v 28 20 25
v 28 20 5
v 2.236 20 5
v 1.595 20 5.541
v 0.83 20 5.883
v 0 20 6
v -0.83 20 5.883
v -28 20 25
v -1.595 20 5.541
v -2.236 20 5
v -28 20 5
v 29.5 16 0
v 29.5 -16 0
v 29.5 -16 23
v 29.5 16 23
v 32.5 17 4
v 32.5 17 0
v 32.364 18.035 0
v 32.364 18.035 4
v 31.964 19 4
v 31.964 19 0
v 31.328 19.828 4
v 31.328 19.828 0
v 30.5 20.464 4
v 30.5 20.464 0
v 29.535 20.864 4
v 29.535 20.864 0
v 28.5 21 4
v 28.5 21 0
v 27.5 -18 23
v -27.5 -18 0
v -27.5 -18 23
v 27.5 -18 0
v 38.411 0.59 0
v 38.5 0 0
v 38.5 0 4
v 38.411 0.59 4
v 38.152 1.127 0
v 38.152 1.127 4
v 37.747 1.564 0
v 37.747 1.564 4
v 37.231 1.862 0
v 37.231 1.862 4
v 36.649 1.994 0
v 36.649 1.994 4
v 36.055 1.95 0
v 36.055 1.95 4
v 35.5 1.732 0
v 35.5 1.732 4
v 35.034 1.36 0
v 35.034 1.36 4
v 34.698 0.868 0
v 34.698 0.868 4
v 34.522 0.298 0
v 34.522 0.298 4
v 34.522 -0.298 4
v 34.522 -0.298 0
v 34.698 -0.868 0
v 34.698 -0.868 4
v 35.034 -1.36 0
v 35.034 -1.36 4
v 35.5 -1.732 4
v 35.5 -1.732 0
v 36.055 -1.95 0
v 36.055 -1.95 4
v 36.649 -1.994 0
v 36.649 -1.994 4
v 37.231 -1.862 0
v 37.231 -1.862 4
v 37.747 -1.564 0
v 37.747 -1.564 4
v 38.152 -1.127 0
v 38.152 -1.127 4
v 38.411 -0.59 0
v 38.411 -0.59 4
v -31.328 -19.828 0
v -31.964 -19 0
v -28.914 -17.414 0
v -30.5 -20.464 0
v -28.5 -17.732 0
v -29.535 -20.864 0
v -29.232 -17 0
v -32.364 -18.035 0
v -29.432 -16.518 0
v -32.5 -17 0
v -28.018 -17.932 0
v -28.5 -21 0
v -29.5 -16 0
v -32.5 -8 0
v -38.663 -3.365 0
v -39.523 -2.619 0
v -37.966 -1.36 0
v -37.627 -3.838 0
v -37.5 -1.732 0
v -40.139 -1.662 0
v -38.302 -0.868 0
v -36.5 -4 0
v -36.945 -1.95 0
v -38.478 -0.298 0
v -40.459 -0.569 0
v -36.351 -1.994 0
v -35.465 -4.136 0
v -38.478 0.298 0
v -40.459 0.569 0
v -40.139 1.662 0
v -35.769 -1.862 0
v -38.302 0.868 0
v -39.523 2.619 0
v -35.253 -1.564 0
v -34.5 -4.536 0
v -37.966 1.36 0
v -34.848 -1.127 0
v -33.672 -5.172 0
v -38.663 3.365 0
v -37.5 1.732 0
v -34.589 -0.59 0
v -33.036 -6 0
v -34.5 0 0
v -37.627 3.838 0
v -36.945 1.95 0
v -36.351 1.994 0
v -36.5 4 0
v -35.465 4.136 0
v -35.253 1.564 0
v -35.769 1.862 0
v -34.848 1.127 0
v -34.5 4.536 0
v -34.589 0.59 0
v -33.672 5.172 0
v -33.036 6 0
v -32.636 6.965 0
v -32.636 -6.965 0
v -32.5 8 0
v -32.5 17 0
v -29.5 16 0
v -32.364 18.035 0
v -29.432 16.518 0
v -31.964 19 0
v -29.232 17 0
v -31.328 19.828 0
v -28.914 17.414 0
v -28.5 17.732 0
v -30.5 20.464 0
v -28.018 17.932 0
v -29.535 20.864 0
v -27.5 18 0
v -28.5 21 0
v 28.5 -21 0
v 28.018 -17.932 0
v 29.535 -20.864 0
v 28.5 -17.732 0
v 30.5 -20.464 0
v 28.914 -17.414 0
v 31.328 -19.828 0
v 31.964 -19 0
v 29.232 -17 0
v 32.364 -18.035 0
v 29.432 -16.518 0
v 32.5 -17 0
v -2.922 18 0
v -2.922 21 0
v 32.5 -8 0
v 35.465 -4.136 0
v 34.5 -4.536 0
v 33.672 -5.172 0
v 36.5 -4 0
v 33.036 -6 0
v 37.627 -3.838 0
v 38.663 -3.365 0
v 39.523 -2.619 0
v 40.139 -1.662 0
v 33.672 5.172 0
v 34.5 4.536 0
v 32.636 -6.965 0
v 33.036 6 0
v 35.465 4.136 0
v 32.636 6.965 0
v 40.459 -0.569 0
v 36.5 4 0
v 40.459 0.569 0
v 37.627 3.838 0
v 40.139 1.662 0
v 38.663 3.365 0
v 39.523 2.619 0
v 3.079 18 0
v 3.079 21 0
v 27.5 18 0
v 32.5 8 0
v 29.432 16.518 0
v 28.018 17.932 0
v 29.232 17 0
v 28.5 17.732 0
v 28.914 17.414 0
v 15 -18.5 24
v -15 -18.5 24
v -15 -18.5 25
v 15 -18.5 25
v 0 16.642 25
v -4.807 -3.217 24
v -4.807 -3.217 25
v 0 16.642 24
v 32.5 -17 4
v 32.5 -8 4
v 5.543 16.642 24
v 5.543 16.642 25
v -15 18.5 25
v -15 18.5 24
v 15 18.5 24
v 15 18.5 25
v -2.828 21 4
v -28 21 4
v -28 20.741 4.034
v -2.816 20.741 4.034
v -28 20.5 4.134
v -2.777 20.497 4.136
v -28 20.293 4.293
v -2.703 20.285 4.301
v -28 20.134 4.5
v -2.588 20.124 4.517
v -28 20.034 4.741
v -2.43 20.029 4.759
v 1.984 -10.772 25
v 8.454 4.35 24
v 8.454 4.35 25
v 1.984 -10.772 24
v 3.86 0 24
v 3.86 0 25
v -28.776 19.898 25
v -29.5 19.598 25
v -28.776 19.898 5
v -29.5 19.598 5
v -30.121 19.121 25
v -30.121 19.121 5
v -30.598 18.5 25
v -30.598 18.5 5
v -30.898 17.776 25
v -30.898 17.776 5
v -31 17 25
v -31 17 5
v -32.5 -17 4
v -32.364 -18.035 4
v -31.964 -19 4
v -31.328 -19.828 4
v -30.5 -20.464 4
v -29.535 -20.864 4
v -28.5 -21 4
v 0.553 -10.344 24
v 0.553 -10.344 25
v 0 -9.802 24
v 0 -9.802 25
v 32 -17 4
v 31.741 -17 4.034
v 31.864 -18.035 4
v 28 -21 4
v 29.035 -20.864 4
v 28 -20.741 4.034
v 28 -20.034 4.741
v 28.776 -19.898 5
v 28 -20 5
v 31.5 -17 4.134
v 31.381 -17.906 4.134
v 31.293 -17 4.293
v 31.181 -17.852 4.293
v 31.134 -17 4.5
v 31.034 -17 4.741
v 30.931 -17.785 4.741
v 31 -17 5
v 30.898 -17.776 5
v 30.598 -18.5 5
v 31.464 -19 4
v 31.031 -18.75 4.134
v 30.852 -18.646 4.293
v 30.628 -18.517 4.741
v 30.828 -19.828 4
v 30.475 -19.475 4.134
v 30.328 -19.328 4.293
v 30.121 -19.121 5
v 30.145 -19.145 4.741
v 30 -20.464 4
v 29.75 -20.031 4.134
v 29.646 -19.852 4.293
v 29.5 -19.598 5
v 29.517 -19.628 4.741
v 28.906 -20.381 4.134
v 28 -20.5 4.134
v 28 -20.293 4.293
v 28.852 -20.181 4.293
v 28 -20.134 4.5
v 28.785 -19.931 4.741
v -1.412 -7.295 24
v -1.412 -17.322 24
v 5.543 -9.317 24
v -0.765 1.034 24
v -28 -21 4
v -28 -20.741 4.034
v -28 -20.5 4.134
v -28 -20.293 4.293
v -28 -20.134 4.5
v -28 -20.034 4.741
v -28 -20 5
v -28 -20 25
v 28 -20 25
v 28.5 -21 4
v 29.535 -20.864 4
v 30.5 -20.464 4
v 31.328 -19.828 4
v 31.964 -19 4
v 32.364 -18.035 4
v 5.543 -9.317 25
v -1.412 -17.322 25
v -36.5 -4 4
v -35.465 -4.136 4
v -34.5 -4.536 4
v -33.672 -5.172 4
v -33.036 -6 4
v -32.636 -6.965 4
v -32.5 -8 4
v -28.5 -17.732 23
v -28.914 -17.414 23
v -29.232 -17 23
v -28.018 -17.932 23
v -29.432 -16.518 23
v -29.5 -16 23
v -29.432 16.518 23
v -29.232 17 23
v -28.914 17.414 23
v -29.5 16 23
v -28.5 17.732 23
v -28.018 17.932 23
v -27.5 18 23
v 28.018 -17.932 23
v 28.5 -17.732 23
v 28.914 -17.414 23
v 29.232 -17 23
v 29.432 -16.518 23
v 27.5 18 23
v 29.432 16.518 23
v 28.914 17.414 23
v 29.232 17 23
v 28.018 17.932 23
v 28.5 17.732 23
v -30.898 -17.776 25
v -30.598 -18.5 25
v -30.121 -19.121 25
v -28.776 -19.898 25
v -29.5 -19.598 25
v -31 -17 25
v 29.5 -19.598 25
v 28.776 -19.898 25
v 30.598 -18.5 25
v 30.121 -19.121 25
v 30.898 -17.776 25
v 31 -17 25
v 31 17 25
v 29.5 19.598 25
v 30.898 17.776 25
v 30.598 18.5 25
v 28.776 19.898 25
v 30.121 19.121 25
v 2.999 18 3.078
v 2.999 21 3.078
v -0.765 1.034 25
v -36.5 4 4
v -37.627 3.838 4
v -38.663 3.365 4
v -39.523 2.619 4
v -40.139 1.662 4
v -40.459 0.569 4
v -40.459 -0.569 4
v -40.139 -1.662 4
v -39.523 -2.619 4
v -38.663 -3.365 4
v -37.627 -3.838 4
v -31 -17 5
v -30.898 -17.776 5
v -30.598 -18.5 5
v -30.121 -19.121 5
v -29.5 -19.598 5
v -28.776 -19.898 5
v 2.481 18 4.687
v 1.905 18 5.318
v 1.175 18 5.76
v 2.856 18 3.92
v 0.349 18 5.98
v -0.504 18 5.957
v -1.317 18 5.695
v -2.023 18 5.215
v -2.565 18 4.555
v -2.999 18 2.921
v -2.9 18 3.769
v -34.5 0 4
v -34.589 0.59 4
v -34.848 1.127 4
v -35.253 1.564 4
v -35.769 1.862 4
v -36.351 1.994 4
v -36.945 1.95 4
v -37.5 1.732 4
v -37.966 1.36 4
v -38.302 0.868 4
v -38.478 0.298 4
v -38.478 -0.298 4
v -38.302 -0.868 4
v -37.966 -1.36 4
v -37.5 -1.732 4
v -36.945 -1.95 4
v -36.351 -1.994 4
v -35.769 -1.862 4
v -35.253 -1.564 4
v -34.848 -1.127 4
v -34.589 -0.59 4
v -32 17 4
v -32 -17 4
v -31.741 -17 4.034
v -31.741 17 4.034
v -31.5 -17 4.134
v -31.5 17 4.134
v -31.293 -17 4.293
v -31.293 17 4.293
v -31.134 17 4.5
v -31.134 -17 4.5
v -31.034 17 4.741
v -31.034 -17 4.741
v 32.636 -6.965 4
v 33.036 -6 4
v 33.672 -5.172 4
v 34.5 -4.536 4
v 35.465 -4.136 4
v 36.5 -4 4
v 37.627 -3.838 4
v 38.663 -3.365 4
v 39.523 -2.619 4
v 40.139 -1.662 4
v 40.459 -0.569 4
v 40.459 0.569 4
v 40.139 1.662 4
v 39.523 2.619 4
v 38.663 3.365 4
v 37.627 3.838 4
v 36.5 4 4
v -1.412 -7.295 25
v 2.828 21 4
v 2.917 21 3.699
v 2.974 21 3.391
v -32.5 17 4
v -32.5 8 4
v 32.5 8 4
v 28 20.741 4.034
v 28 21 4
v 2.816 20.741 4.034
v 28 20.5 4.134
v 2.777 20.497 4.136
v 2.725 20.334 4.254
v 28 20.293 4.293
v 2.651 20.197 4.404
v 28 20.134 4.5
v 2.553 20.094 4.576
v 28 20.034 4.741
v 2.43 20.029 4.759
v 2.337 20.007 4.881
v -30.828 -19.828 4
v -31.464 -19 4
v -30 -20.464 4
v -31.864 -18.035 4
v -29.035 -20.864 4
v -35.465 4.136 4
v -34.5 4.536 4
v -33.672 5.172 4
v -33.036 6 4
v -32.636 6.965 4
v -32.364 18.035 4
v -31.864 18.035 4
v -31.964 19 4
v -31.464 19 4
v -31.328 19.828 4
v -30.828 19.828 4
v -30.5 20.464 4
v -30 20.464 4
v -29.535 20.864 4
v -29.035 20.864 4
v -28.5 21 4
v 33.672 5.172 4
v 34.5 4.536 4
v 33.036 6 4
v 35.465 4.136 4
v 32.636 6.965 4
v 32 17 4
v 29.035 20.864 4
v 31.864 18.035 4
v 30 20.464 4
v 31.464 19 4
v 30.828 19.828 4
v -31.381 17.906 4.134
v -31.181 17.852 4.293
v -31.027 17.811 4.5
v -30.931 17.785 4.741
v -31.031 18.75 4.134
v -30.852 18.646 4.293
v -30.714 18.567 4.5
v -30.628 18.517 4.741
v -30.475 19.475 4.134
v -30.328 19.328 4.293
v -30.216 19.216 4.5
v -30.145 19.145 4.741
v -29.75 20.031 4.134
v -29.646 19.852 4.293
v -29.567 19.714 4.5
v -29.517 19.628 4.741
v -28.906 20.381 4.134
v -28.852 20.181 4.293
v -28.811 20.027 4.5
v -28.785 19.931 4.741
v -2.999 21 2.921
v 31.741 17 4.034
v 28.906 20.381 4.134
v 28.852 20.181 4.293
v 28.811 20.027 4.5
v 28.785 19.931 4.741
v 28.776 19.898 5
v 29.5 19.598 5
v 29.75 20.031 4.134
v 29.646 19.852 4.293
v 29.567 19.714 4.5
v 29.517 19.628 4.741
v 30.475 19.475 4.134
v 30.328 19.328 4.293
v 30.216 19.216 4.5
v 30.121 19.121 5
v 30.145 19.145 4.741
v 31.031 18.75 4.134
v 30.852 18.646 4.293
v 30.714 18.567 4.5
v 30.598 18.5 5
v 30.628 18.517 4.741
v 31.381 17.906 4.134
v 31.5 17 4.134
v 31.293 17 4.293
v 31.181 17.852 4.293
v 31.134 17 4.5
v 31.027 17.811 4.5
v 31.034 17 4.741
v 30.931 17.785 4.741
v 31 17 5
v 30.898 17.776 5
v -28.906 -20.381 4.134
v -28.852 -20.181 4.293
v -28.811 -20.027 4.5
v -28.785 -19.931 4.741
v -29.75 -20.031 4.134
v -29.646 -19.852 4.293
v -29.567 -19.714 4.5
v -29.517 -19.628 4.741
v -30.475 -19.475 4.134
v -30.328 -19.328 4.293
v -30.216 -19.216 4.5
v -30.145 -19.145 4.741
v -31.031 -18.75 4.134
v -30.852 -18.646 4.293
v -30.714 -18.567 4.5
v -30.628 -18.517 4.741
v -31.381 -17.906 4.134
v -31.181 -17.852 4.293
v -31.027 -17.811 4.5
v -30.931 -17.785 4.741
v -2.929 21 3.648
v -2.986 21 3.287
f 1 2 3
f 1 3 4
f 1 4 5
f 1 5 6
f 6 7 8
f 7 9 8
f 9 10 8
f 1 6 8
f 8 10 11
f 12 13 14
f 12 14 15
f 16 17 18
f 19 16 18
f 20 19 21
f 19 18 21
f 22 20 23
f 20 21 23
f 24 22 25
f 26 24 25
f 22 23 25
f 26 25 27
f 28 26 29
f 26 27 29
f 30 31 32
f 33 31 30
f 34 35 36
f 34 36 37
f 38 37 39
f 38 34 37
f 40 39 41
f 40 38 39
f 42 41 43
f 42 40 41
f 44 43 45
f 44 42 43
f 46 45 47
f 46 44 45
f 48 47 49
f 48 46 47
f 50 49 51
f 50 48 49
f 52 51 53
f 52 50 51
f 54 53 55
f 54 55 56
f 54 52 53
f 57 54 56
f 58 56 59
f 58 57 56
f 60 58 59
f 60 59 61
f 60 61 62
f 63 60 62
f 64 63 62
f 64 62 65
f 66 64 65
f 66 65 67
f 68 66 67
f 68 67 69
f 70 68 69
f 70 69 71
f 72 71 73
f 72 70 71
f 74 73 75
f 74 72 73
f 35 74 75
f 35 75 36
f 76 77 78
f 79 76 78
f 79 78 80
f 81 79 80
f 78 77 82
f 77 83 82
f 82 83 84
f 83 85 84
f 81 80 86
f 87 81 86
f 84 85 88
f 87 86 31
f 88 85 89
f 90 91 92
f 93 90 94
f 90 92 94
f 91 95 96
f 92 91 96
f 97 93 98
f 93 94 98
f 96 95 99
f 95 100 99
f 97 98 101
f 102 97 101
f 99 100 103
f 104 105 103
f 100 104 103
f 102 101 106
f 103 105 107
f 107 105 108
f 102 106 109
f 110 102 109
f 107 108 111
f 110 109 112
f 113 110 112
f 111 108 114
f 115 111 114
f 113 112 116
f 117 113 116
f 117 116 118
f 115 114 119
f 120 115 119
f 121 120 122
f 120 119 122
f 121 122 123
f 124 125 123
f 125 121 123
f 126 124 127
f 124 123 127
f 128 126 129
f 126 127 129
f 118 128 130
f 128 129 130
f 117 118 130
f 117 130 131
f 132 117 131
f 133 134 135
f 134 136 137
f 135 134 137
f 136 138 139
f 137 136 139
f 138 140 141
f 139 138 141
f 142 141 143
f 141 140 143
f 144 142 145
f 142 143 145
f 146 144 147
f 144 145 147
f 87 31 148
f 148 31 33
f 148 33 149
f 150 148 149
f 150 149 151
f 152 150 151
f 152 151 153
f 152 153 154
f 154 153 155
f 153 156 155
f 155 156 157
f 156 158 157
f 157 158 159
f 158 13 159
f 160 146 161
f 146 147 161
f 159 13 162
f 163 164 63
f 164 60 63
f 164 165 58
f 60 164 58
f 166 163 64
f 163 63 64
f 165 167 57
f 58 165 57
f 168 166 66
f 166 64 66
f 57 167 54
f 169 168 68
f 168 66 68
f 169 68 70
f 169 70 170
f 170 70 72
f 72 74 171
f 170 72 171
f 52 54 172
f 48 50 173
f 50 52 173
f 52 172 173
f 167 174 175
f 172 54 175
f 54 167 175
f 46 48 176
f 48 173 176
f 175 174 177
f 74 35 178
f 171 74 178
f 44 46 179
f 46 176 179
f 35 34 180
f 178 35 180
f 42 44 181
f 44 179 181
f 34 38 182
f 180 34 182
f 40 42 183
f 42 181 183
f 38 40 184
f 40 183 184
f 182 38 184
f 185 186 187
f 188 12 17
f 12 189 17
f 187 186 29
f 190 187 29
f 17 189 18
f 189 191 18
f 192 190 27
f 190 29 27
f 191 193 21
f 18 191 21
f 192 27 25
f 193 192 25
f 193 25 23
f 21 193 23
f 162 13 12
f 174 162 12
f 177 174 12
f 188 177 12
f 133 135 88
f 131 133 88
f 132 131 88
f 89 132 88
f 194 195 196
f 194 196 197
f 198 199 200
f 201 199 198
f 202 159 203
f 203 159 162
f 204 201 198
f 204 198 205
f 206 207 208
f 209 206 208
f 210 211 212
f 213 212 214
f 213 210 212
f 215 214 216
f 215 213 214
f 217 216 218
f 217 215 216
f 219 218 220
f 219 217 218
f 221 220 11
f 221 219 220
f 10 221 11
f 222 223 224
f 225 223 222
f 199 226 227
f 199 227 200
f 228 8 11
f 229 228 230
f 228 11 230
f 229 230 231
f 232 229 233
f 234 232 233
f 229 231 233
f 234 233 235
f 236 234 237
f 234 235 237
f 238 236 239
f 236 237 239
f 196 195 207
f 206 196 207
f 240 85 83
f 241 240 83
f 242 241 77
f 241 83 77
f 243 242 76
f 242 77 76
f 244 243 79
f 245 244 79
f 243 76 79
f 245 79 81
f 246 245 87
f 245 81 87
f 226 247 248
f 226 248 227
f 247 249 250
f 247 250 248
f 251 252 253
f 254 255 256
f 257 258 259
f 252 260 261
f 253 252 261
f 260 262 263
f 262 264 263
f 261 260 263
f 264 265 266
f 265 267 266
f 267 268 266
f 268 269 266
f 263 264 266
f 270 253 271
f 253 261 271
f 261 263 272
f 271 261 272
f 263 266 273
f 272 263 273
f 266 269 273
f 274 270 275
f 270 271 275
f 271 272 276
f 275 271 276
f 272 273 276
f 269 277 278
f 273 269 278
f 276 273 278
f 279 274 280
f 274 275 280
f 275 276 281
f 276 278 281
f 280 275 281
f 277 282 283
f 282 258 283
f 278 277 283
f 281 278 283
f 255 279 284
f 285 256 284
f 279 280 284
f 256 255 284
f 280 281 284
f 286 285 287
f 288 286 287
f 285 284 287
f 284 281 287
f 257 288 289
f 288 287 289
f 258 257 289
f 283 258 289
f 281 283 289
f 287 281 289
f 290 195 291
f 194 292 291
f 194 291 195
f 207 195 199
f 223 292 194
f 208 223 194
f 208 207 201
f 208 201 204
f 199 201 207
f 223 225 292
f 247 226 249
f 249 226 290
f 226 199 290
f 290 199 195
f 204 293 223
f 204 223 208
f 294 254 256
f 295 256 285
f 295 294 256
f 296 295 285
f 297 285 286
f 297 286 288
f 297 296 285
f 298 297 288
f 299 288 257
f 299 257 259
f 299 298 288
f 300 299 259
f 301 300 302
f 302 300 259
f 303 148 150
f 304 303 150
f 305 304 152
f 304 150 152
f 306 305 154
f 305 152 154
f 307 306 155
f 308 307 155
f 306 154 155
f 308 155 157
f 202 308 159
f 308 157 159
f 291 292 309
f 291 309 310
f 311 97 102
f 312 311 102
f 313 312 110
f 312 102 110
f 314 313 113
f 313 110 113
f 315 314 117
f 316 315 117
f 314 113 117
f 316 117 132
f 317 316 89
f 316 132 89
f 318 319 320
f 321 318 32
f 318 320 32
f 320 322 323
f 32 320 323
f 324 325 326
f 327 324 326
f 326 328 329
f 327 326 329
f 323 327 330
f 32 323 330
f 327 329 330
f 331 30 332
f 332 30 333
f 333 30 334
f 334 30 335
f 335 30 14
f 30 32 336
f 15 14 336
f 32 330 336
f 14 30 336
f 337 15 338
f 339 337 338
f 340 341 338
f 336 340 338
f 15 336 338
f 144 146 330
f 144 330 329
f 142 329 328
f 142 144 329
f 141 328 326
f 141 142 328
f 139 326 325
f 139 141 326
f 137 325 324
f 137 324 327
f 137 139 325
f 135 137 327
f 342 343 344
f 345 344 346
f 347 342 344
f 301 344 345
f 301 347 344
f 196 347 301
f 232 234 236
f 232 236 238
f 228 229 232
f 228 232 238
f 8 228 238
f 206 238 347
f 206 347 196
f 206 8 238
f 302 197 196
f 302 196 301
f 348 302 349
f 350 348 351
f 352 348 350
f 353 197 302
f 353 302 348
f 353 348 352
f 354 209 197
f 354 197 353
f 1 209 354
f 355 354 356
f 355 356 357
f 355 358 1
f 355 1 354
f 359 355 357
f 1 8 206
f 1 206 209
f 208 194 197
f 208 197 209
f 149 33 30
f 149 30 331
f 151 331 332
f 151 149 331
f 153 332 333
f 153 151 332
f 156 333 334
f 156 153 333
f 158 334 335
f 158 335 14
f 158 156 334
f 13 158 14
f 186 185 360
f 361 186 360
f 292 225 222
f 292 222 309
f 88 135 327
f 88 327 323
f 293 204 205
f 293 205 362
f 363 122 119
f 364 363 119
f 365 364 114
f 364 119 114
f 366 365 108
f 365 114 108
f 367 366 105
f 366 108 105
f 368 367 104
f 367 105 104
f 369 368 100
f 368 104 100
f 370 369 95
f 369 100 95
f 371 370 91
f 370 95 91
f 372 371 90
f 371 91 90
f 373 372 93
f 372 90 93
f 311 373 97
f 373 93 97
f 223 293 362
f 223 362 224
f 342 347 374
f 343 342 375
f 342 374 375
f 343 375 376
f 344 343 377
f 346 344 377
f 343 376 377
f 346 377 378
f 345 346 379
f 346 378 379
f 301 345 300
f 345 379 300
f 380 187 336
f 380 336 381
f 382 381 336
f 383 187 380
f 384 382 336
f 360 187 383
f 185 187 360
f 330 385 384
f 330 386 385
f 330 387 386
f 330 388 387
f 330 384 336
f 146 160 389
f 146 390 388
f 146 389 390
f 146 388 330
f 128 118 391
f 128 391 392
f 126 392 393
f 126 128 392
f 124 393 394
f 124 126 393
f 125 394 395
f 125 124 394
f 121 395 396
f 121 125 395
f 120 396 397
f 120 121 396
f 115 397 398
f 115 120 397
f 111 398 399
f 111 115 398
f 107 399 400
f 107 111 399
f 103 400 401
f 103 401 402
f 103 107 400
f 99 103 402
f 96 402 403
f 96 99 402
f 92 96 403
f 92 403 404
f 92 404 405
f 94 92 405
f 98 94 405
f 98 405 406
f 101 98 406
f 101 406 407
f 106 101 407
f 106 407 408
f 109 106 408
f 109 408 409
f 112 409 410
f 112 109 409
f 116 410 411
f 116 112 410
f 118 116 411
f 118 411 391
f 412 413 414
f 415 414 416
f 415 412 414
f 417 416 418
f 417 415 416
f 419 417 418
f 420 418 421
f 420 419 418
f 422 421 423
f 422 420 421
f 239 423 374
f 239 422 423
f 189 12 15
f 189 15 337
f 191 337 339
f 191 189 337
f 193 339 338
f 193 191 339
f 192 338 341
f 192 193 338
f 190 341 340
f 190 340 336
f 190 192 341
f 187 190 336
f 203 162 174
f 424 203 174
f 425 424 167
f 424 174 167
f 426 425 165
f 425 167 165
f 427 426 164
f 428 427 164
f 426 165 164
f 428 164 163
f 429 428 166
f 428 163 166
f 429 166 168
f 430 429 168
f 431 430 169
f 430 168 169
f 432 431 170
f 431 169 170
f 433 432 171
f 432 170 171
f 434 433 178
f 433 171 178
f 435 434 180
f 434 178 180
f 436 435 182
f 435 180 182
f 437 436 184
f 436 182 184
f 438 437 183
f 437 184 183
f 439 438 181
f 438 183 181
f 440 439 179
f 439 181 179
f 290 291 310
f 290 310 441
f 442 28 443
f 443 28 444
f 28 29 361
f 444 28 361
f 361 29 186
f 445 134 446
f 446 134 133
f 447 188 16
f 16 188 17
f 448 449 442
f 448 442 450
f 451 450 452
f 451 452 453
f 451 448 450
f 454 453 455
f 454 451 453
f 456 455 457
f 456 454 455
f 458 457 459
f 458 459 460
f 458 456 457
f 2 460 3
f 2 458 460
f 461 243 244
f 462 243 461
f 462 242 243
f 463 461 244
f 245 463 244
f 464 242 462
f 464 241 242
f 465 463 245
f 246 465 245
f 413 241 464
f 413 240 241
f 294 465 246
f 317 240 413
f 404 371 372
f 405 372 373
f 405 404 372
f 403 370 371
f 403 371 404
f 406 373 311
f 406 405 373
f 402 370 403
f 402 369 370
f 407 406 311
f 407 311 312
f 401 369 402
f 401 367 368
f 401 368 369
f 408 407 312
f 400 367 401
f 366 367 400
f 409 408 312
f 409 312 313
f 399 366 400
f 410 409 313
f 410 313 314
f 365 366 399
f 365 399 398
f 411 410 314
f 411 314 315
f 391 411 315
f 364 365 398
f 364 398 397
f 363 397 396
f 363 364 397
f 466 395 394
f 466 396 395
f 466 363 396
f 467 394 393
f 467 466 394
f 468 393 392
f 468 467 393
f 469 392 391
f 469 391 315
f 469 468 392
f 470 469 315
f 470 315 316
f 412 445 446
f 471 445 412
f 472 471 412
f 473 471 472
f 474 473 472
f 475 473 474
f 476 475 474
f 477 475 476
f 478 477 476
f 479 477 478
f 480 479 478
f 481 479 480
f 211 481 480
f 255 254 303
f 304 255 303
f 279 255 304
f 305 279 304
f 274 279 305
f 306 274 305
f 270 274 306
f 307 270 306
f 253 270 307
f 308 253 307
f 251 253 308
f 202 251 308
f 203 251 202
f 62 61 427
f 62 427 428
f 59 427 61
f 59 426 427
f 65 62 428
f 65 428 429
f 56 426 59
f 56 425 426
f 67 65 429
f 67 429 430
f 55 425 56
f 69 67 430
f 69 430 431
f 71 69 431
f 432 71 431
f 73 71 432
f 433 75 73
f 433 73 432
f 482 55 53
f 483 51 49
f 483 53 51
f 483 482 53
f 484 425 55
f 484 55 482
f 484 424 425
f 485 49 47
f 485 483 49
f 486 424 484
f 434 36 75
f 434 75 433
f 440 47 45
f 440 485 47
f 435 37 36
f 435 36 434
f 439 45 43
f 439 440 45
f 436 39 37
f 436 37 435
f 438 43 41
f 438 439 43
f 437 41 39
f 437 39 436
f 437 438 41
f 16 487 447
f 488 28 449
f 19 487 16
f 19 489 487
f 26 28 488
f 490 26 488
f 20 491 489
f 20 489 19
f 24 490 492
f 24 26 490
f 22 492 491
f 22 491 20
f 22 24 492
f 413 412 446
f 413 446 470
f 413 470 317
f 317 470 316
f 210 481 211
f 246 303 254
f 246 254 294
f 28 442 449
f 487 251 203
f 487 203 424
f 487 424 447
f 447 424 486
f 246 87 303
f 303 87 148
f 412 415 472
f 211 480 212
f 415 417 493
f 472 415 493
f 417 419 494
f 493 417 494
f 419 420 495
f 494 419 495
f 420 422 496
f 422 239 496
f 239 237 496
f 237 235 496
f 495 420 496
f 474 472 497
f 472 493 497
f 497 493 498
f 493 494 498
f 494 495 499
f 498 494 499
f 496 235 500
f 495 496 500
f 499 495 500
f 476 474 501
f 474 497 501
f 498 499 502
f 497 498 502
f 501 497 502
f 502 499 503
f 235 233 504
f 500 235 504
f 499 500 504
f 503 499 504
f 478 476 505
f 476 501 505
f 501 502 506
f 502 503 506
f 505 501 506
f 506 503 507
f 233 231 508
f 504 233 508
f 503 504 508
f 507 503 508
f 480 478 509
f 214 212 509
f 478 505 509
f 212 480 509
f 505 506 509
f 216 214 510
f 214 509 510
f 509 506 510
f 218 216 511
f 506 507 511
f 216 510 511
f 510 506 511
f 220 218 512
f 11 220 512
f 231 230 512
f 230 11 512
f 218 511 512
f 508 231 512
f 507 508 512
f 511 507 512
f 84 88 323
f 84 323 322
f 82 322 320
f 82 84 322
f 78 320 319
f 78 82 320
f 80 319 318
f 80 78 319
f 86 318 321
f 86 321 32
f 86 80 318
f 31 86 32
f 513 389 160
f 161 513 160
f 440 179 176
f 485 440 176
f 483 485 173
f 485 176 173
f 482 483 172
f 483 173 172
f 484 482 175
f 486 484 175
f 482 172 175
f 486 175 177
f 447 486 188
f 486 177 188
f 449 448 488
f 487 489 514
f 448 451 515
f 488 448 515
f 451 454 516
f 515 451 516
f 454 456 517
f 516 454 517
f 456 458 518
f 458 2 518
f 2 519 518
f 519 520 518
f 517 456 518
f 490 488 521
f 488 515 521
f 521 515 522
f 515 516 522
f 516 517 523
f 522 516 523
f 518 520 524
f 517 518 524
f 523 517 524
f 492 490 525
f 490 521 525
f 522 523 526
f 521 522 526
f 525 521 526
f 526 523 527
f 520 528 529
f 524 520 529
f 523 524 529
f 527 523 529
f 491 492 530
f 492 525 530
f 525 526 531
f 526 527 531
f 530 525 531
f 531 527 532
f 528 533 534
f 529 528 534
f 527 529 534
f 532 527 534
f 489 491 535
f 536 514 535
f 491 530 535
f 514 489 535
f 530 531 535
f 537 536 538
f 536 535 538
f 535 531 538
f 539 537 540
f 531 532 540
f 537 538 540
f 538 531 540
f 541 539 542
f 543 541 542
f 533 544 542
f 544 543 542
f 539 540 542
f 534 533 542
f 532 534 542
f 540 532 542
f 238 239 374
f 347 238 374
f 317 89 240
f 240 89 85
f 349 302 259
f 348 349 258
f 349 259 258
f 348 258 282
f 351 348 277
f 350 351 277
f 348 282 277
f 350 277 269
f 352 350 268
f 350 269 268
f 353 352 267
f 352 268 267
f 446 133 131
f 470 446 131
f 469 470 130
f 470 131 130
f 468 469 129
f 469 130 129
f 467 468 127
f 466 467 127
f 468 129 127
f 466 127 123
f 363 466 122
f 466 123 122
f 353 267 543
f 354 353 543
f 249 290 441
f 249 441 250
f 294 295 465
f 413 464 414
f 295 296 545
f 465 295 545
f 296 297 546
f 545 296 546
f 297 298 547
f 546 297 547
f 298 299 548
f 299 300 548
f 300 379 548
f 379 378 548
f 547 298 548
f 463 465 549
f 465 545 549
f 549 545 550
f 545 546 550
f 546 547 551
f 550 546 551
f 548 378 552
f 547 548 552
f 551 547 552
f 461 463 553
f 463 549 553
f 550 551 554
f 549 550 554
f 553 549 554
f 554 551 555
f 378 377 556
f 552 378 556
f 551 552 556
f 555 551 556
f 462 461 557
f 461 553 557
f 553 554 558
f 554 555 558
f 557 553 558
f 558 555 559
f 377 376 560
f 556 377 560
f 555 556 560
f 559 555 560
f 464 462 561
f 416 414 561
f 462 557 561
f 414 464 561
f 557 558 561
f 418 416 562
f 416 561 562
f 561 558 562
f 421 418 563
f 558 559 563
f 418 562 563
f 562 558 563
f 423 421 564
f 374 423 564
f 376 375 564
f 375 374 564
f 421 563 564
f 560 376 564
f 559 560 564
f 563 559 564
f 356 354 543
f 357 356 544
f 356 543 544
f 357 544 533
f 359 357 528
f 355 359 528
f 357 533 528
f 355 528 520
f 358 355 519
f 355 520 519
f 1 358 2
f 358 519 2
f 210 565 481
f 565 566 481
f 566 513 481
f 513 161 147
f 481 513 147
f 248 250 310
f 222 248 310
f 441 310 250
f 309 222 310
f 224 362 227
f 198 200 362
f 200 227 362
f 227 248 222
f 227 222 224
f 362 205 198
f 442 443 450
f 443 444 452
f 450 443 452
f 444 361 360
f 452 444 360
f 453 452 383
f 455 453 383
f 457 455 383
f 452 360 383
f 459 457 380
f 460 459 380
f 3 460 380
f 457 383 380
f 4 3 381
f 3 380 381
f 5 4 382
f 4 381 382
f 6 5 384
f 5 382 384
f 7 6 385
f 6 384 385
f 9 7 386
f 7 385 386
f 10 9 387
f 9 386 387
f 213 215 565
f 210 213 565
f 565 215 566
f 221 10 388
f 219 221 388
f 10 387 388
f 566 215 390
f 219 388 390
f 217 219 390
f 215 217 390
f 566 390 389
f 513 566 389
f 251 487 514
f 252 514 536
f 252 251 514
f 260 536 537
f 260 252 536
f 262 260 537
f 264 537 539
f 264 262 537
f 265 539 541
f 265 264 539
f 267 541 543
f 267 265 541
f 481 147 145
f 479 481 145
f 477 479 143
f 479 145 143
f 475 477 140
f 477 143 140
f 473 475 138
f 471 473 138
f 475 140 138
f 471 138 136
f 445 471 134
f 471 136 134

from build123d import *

# Parameters (mm, degrees)
F0_R     = 2
F1_DEPTH = 4
F3_DEPTH = 25
F4_R     = 0.99999
F5_DEPTH = 23
F7_START = 24
F6_W     = 30
F6_H     = 37
F7_DEPTH = 6
F9_DEPTH = 25


# Not quite as in the source:
# - a fillet or chamfer is up to 0.001 mm smaller than in the source, because OpenCascade refuses the exact size


with BuildPart() as f1:
    # F0 (on Top) → F1 (new body)
    with BuildSketch(Plane.XY):
        with BuildLine():
            Line((28.5, 21), (-28.5, 21))
            ThreePointArc((-28.5, 21), (-31.3284271247, 19.8284271247), (-32.5, 17))
            Line((-32.5, 17), (-32.5, 8))
            ThreePointArc((-32.5, 8), (-33.6715728753, 5.1715728753), (-36.5, 4))
            ThreePointArc((-36.5, 4), (-40.5, 0), (-36.5, -4))
            ThreePointArc((-36.5, -4), (-33.6715728753, -5.1715728753), (-32.5, -8))
            Line((-32.5, -8), (-32.5, -17))
            ThreePointArc((-32.5, -17), (-31.3284271247, -19.8284271247), (-28.5, -21))
            Line((-28.5, -21), (28.5, -21))
            ThreePointArc((28.5, -21), (31.3284271247, -19.8284271247), (32.5, -17))
            Line((32.5, -17), (32.5, -8))
            ThreePointArc((32.5, -8), (33.6715728753, -5.1715728753), (36.5, -4))
            ThreePointArc((36.5, -4), (40.5, 0), (36.5, 4))
            ThreePointArc((36.5, 4), (33.6715728753, 5.1715728753), (32.5, 8))
            Line((32.5, 8), (32.5, 17))
            ThreePointArc((32.5, 17), (31.3284271247, 19.8284271247), (28.5, 21))
        make_face()
        with Locations((-36.5, 0)):
            Circle(F0_R, mode=Mode.SUBTRACT)
        with BuildLine():
            ThreePointArc((29.5, -16), (28.9142135624, -17.4142135624), (27.5, -18))
            Line((27.5, -18), (-27.5, -18))
            ThreePointArc((-27.5, -18), (-28.9142135624, -17.4142135624), (-29.5, -16))
            Line((-29.5, -16), (-29.5, 16))
            ThreePointArc((-29.5, 16), (-28.9142135624, 17.4142135624), (-27.5, 18))
            Line((-27.5, 18), (27.5, 18))
            ThreePointArc((27.5, 18), (28.9142135624, 17.4142135624), (29.5, 16))
            Line((29.5, 16), (29.5, -16))
        make_face(mode=Mode.SUBTRACT)
        with Locations((36.5, 0)):
            Circle(F0_R, mode=Mode.SUBTRACT)
    extrude(amount=F1_DEPTH)

    # F2 (on Top) → F3 (join)
    with BuildSketch(Plane.XY):
        with BuildLine():
            Line((28, 20), (-28, 20))
            ThreePointArc((-28, 20), (-30.1213203436, 19.1213203436), (-31, 17))
            Line((-31, 17), (-31, -17))
            ThreePointArc((-31, -17), (-30.1213203436, -19.1213203436), (-28, -20))
            Line((-28, -20), (28, -20))
            ThreePointArc((28, -20), (30.1213203436, -19.1213203436), (31, -17))
            Line((31, -17), (31, 17))
            ThreePointArc((31, 17), (30.1213203436, 19.1213203436), (28, 20))
        make_face()
    extrude(amount=F3_DEPTH)

    # F4 (radius 1 in the source; OpenCascade refuses exactly that, so slightly less here)
    f4_edges = [f1.edges().sort_by_distance(p)[0] for p in [
        (0, -20, 4),
        (30.12132, -19.12132, 4),
    ]]
    fillet(f4_edges, radius=F4_R)

    # F0 (on Top) → F5 (cut)
    with BuildSketch(Plane.XY):
        with BuildLine():
            Line((-27.5, -18), (27.5, -18))
            ThreePointArc((27.5, -18), (28.9142135624, -17.4142135624), (29.5, -16))
            Line((29.5, -16), (29.5, 16))
            ThreePointArc((29.5, 16), (28.9142135624, 17.4142135624), (27.5, 18))
            Line((27.5, 18), (-27.5, 18))
            ThreePointArc((-27.5, 18), (-28.9142135624, 17.4142135624), (-29.5, 16))
            Line((-29.5, 16), (-29.5, -16))
            ThreePointArc((-29.5, -16), (-28.9142135624, -17.4142135624), (-27.5, -18))
        make_face()
    extrude(amount=F5_DEPTH, mode=Mode.SUBTRACT)

    # F6 (on Top) → F7 (cut)
    with BuildSketch(Plane.XY.offset(F7_START)):
        Rectangle(F6_W, F6_H)
        Polygon((-4.8068542965, -3.2168254256), (0, 16.6418794543), (5.5426517501, 16.6418794543), (-0.7649944164, 1.0344976326), (8.4538720548, 4.3500550091), (1.9844917115, -10.7721220702), (5.5426517501, -9.3165114522), (-1.4119322877, -17.3223689198), (-1.4119322877, -7.2948294692), (0, -9.8017146811), (0.5527317408, -10.3439353406), (3.8597108796, 0), align=None, mode=Mode.SUBTRACT)
    extrude(amount=F7_DEPTH, mode=Mode.SUBTRACT)

    # F8 (on Front) → F9 (cut)
    with BuildSketch(Plane.XZ):
        with BuildLine():
            Line((3.1964714846, -4.5143875896), (2.9989856559, 3.0780066406))
            ThreePointArc((2.9989856559, 3.0780066406), (-0.0784155915, 5.9989749907), (-2.9989642698, 2.921175459))
            Line((-2.9989642698, 2.921175459), (-2.8035285154, -4.5143875896))
            Line((-2.8035285154, -4.5143875896), (3.1964714846, -4.5143875896))
        make_face()
    extrude(amount=-F9_DEPTH, mode=Mode.SUBTRACT)


solid = f1.part
